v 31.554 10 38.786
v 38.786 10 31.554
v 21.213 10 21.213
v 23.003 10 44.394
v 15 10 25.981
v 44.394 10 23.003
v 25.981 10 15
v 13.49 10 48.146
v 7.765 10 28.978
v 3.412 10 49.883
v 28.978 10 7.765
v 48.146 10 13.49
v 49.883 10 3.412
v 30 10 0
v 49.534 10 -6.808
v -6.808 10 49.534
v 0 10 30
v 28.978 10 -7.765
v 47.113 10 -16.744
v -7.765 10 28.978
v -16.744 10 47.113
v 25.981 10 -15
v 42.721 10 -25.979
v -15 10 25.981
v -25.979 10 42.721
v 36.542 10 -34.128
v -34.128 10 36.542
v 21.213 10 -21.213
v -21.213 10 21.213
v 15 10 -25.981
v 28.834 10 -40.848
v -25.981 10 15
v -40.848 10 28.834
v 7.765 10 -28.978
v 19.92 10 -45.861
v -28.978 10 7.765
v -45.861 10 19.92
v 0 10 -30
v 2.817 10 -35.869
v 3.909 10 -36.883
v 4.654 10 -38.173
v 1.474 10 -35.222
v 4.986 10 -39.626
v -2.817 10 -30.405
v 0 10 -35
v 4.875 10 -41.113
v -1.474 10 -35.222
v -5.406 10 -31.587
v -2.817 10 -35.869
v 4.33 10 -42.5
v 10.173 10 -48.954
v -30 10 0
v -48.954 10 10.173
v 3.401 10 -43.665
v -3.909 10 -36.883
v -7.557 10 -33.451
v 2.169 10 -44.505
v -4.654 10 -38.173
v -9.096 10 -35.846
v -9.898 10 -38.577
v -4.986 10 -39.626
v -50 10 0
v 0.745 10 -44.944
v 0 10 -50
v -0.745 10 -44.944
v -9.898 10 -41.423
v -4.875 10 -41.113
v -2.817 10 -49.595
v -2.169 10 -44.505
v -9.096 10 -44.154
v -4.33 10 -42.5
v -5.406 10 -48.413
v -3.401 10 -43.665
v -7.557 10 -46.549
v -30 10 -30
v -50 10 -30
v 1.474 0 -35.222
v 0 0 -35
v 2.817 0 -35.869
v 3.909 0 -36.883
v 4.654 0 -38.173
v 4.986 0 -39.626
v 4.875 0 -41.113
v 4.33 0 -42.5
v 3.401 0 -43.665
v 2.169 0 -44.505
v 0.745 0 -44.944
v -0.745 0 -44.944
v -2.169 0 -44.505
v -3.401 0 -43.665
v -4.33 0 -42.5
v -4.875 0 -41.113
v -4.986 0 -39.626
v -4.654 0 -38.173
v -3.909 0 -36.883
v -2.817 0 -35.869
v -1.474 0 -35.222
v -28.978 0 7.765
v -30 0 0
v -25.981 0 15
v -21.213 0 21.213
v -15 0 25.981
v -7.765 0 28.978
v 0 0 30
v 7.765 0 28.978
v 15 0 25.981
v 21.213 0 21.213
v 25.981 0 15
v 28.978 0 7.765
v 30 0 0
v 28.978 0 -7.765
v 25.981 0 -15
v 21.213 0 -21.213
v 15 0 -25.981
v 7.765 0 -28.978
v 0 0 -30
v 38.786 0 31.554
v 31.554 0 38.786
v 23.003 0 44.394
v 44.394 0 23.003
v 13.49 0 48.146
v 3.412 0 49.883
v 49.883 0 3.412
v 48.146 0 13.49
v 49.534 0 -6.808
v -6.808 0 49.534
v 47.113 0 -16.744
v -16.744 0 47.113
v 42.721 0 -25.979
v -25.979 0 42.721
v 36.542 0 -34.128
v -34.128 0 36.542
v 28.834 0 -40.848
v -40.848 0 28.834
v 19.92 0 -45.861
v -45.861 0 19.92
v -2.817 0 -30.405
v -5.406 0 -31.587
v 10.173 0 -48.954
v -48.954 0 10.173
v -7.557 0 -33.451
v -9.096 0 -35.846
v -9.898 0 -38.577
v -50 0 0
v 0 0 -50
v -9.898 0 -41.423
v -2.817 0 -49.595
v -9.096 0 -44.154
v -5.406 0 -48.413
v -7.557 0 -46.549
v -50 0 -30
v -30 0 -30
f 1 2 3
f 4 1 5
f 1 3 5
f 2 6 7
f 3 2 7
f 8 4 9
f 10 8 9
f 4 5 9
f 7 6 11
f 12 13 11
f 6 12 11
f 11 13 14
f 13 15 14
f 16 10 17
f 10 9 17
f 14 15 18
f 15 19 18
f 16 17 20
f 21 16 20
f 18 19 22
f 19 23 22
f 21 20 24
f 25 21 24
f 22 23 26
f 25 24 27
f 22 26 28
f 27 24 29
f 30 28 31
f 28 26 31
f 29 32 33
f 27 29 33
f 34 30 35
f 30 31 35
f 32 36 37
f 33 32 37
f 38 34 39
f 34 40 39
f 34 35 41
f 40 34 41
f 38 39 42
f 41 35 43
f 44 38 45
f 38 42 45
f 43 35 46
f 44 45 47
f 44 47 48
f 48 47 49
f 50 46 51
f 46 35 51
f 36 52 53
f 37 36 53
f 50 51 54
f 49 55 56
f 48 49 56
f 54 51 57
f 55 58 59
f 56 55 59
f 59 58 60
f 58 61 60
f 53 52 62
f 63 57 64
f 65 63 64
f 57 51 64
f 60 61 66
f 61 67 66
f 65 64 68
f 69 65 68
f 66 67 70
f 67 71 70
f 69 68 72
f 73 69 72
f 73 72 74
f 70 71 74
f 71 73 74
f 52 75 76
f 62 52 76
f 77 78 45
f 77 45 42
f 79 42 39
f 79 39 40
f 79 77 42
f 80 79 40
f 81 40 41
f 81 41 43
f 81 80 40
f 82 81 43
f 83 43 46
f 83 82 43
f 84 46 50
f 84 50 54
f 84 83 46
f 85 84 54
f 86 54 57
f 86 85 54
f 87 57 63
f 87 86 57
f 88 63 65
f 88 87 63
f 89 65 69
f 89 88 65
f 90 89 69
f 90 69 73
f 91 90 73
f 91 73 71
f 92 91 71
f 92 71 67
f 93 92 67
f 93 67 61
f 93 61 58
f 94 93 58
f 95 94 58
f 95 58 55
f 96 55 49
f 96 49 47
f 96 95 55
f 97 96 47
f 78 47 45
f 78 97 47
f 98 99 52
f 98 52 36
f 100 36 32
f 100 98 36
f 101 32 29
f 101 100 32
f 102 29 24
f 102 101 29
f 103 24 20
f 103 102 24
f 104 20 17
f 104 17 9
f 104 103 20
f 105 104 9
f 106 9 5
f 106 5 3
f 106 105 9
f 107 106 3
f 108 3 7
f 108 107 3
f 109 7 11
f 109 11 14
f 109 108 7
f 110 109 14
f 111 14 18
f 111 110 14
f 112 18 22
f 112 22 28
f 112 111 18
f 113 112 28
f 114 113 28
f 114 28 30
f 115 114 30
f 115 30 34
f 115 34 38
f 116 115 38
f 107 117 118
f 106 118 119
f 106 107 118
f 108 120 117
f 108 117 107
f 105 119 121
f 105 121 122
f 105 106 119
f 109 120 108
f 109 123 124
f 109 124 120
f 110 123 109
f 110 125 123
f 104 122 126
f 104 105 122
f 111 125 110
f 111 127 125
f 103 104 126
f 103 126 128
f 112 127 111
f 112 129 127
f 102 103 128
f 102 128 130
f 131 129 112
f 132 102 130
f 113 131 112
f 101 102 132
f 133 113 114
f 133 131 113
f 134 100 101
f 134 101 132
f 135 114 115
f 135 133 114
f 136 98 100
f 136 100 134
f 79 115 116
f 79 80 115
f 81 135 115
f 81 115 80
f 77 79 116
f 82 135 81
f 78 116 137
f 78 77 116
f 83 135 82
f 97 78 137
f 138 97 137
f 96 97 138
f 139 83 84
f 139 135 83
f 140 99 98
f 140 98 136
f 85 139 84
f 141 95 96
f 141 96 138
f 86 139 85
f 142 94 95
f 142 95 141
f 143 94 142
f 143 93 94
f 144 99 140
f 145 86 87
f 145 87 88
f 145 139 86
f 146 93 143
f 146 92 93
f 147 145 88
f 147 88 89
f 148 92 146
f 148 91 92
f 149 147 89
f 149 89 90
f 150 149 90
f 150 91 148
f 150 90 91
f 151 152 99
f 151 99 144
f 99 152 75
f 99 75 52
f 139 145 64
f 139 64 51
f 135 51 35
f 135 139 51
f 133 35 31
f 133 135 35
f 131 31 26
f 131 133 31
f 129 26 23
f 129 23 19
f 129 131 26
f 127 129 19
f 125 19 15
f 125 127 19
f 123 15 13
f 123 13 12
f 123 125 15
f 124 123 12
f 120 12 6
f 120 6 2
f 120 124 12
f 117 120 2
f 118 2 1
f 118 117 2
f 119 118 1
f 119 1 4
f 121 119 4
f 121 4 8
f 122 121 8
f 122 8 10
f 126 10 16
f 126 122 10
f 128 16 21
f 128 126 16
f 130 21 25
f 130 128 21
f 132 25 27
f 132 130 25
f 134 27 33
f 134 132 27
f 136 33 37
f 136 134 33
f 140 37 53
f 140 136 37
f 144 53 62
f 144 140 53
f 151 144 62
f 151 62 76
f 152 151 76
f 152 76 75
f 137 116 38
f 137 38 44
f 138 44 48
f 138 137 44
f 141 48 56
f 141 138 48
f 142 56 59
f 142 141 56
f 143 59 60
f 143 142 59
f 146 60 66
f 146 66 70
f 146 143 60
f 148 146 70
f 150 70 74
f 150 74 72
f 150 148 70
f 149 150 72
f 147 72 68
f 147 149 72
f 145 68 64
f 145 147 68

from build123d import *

# Parameters (mm, degrees)
SKETCH_1_R      = 5
EXTRUDE_1_DEPTH = 10


with BuildPart() as part:
    # 草图1 → 凸台-拉伸1 (new body)
    with BuildSketch(Plane(origin=(0, 0, 0), x_dir=(1, 0, 0), z_dir=(0, 1, 0))):
        with BuildLine():
            Line((-50, 0), (-50, 30))
            Line((-50, 30), (-30, 30))
            Line((-30, 30), (-30, 0))
            ThreePointArc((-30, 0), (21.213203436, -21.213203436), (0, 30))
            ThreePointArc((0, 30), (-10, 40), (0, 50))
            ThreePointArc((0, 50), (35.355339059, -35.355339059), (-50, 0))
        make_face()
        with Locations(Location((0, 40, 0), (0, 0, 270))):
            Circle(SKETCH_1_R, mode=Mode.SUBTRACT)
    extrude(amount=EXTRUDE_1_DEPTH)


solid = part.part
